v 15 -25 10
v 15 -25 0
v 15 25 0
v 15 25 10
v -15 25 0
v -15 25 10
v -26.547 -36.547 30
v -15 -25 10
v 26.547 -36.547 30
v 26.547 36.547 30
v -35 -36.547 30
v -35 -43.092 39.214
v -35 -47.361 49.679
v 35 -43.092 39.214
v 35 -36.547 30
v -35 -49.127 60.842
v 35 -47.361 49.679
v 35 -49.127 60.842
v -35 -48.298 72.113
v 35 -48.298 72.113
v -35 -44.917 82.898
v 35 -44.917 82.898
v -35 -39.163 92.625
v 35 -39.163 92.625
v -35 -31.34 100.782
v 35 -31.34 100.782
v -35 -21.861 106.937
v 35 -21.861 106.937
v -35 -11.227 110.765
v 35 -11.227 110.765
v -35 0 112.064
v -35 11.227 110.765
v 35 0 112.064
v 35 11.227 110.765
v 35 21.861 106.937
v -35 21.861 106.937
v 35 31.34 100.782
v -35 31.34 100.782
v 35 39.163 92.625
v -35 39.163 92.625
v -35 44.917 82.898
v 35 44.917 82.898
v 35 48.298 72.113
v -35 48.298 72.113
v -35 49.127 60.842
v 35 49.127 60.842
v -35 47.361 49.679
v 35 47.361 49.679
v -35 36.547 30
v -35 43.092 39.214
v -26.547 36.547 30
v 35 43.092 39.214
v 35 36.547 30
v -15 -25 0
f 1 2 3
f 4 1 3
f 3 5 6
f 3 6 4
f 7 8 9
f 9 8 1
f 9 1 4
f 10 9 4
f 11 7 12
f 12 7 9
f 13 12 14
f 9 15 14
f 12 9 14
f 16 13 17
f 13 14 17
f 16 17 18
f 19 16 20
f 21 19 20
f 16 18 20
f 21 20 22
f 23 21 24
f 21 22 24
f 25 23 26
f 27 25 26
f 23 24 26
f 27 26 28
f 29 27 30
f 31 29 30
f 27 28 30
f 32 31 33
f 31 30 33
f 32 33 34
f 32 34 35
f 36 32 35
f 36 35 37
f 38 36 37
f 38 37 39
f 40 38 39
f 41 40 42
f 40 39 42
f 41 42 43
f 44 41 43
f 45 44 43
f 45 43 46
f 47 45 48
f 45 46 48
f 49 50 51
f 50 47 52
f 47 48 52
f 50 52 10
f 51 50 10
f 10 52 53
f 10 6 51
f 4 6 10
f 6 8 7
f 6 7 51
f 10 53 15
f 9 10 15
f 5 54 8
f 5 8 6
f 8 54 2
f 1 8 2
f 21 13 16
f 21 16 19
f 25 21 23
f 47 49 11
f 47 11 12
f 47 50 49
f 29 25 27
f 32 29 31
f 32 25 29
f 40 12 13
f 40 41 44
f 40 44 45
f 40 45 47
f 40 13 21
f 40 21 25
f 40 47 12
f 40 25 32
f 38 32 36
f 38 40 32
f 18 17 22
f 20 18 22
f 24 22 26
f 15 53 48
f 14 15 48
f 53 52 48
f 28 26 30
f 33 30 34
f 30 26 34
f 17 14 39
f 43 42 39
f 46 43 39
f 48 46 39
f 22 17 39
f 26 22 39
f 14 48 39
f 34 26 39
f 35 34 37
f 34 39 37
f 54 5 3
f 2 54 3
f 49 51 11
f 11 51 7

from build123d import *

# Parameters (mm, degrees)
SKETCH_1_W      = 30
SKETCH_1_H      = 50
EXTRUDE_1_DEPTH = 10
SKETCH_2_W      = 30
SKETCH_2_H      = 50
EXTRUDE_2_DEPTH = 20
EXTRUDE_2_DRAFT = -30
EXTRUDE_3_DEPTH = 35


with BuildPart() as part:
    # 草图1 → 凸台-拉伸1 (new body)
    with BuildSketch(Plane.XY):
        Rectangle(SKETCH_1_W, SKETCH_1_H)
    extrude(amount=EXTRUDE_1_DEPTH)


with BuildPart() as extrude_2_tool:
    # 草图2 → 凸台-拉伸2 (with draft: the straight prism first)
    with BuildSketch(Plane.XY.offset(10)):
        Rectangle(SKETCH_2_W, SKETCH_2_H)
    extrude(amount=EXTRUDE_2_DEPTH)
    # 凸台-拉伸2: the draft: its side faces are tilted about the plane it starts from
    extrude_2_sides = [extrude_2_tool.faces().sort_by_distance(p)[0] for p in [
        (15, 0, 20),
        (0, 25, 20),
        (-15, 0, 20),
        (0, -25, 20),
    ]]
    draft(extrude_2_sides, Plane.XY.offset(10), EXTRUDE_2_DRAFT)


with BuildPart() as part_1:
    add(part.part)

    # 凸台-拉伸2: add extrude_2_tool
    add(extrude_2_tool.part)

    # 草图3 → 凸台-拉伸3 (add, symmetric)
    with BuildSketch(Plane(origin=(0, 0, 0), x_dir=(0, 0, -1), z_dir=(1, 0, 0))):
        with BuildLine():
            Line((-30, 36.547005384), (-30, -36.547005384))
            ThreePointArc((-30, -36.547005384), (-112.063957994, 0), (-30, 36.547005384))
        make_face()
    extrude(amount=EXTRUDE_3_DEPTH, both=True)


solid = part_1.part
